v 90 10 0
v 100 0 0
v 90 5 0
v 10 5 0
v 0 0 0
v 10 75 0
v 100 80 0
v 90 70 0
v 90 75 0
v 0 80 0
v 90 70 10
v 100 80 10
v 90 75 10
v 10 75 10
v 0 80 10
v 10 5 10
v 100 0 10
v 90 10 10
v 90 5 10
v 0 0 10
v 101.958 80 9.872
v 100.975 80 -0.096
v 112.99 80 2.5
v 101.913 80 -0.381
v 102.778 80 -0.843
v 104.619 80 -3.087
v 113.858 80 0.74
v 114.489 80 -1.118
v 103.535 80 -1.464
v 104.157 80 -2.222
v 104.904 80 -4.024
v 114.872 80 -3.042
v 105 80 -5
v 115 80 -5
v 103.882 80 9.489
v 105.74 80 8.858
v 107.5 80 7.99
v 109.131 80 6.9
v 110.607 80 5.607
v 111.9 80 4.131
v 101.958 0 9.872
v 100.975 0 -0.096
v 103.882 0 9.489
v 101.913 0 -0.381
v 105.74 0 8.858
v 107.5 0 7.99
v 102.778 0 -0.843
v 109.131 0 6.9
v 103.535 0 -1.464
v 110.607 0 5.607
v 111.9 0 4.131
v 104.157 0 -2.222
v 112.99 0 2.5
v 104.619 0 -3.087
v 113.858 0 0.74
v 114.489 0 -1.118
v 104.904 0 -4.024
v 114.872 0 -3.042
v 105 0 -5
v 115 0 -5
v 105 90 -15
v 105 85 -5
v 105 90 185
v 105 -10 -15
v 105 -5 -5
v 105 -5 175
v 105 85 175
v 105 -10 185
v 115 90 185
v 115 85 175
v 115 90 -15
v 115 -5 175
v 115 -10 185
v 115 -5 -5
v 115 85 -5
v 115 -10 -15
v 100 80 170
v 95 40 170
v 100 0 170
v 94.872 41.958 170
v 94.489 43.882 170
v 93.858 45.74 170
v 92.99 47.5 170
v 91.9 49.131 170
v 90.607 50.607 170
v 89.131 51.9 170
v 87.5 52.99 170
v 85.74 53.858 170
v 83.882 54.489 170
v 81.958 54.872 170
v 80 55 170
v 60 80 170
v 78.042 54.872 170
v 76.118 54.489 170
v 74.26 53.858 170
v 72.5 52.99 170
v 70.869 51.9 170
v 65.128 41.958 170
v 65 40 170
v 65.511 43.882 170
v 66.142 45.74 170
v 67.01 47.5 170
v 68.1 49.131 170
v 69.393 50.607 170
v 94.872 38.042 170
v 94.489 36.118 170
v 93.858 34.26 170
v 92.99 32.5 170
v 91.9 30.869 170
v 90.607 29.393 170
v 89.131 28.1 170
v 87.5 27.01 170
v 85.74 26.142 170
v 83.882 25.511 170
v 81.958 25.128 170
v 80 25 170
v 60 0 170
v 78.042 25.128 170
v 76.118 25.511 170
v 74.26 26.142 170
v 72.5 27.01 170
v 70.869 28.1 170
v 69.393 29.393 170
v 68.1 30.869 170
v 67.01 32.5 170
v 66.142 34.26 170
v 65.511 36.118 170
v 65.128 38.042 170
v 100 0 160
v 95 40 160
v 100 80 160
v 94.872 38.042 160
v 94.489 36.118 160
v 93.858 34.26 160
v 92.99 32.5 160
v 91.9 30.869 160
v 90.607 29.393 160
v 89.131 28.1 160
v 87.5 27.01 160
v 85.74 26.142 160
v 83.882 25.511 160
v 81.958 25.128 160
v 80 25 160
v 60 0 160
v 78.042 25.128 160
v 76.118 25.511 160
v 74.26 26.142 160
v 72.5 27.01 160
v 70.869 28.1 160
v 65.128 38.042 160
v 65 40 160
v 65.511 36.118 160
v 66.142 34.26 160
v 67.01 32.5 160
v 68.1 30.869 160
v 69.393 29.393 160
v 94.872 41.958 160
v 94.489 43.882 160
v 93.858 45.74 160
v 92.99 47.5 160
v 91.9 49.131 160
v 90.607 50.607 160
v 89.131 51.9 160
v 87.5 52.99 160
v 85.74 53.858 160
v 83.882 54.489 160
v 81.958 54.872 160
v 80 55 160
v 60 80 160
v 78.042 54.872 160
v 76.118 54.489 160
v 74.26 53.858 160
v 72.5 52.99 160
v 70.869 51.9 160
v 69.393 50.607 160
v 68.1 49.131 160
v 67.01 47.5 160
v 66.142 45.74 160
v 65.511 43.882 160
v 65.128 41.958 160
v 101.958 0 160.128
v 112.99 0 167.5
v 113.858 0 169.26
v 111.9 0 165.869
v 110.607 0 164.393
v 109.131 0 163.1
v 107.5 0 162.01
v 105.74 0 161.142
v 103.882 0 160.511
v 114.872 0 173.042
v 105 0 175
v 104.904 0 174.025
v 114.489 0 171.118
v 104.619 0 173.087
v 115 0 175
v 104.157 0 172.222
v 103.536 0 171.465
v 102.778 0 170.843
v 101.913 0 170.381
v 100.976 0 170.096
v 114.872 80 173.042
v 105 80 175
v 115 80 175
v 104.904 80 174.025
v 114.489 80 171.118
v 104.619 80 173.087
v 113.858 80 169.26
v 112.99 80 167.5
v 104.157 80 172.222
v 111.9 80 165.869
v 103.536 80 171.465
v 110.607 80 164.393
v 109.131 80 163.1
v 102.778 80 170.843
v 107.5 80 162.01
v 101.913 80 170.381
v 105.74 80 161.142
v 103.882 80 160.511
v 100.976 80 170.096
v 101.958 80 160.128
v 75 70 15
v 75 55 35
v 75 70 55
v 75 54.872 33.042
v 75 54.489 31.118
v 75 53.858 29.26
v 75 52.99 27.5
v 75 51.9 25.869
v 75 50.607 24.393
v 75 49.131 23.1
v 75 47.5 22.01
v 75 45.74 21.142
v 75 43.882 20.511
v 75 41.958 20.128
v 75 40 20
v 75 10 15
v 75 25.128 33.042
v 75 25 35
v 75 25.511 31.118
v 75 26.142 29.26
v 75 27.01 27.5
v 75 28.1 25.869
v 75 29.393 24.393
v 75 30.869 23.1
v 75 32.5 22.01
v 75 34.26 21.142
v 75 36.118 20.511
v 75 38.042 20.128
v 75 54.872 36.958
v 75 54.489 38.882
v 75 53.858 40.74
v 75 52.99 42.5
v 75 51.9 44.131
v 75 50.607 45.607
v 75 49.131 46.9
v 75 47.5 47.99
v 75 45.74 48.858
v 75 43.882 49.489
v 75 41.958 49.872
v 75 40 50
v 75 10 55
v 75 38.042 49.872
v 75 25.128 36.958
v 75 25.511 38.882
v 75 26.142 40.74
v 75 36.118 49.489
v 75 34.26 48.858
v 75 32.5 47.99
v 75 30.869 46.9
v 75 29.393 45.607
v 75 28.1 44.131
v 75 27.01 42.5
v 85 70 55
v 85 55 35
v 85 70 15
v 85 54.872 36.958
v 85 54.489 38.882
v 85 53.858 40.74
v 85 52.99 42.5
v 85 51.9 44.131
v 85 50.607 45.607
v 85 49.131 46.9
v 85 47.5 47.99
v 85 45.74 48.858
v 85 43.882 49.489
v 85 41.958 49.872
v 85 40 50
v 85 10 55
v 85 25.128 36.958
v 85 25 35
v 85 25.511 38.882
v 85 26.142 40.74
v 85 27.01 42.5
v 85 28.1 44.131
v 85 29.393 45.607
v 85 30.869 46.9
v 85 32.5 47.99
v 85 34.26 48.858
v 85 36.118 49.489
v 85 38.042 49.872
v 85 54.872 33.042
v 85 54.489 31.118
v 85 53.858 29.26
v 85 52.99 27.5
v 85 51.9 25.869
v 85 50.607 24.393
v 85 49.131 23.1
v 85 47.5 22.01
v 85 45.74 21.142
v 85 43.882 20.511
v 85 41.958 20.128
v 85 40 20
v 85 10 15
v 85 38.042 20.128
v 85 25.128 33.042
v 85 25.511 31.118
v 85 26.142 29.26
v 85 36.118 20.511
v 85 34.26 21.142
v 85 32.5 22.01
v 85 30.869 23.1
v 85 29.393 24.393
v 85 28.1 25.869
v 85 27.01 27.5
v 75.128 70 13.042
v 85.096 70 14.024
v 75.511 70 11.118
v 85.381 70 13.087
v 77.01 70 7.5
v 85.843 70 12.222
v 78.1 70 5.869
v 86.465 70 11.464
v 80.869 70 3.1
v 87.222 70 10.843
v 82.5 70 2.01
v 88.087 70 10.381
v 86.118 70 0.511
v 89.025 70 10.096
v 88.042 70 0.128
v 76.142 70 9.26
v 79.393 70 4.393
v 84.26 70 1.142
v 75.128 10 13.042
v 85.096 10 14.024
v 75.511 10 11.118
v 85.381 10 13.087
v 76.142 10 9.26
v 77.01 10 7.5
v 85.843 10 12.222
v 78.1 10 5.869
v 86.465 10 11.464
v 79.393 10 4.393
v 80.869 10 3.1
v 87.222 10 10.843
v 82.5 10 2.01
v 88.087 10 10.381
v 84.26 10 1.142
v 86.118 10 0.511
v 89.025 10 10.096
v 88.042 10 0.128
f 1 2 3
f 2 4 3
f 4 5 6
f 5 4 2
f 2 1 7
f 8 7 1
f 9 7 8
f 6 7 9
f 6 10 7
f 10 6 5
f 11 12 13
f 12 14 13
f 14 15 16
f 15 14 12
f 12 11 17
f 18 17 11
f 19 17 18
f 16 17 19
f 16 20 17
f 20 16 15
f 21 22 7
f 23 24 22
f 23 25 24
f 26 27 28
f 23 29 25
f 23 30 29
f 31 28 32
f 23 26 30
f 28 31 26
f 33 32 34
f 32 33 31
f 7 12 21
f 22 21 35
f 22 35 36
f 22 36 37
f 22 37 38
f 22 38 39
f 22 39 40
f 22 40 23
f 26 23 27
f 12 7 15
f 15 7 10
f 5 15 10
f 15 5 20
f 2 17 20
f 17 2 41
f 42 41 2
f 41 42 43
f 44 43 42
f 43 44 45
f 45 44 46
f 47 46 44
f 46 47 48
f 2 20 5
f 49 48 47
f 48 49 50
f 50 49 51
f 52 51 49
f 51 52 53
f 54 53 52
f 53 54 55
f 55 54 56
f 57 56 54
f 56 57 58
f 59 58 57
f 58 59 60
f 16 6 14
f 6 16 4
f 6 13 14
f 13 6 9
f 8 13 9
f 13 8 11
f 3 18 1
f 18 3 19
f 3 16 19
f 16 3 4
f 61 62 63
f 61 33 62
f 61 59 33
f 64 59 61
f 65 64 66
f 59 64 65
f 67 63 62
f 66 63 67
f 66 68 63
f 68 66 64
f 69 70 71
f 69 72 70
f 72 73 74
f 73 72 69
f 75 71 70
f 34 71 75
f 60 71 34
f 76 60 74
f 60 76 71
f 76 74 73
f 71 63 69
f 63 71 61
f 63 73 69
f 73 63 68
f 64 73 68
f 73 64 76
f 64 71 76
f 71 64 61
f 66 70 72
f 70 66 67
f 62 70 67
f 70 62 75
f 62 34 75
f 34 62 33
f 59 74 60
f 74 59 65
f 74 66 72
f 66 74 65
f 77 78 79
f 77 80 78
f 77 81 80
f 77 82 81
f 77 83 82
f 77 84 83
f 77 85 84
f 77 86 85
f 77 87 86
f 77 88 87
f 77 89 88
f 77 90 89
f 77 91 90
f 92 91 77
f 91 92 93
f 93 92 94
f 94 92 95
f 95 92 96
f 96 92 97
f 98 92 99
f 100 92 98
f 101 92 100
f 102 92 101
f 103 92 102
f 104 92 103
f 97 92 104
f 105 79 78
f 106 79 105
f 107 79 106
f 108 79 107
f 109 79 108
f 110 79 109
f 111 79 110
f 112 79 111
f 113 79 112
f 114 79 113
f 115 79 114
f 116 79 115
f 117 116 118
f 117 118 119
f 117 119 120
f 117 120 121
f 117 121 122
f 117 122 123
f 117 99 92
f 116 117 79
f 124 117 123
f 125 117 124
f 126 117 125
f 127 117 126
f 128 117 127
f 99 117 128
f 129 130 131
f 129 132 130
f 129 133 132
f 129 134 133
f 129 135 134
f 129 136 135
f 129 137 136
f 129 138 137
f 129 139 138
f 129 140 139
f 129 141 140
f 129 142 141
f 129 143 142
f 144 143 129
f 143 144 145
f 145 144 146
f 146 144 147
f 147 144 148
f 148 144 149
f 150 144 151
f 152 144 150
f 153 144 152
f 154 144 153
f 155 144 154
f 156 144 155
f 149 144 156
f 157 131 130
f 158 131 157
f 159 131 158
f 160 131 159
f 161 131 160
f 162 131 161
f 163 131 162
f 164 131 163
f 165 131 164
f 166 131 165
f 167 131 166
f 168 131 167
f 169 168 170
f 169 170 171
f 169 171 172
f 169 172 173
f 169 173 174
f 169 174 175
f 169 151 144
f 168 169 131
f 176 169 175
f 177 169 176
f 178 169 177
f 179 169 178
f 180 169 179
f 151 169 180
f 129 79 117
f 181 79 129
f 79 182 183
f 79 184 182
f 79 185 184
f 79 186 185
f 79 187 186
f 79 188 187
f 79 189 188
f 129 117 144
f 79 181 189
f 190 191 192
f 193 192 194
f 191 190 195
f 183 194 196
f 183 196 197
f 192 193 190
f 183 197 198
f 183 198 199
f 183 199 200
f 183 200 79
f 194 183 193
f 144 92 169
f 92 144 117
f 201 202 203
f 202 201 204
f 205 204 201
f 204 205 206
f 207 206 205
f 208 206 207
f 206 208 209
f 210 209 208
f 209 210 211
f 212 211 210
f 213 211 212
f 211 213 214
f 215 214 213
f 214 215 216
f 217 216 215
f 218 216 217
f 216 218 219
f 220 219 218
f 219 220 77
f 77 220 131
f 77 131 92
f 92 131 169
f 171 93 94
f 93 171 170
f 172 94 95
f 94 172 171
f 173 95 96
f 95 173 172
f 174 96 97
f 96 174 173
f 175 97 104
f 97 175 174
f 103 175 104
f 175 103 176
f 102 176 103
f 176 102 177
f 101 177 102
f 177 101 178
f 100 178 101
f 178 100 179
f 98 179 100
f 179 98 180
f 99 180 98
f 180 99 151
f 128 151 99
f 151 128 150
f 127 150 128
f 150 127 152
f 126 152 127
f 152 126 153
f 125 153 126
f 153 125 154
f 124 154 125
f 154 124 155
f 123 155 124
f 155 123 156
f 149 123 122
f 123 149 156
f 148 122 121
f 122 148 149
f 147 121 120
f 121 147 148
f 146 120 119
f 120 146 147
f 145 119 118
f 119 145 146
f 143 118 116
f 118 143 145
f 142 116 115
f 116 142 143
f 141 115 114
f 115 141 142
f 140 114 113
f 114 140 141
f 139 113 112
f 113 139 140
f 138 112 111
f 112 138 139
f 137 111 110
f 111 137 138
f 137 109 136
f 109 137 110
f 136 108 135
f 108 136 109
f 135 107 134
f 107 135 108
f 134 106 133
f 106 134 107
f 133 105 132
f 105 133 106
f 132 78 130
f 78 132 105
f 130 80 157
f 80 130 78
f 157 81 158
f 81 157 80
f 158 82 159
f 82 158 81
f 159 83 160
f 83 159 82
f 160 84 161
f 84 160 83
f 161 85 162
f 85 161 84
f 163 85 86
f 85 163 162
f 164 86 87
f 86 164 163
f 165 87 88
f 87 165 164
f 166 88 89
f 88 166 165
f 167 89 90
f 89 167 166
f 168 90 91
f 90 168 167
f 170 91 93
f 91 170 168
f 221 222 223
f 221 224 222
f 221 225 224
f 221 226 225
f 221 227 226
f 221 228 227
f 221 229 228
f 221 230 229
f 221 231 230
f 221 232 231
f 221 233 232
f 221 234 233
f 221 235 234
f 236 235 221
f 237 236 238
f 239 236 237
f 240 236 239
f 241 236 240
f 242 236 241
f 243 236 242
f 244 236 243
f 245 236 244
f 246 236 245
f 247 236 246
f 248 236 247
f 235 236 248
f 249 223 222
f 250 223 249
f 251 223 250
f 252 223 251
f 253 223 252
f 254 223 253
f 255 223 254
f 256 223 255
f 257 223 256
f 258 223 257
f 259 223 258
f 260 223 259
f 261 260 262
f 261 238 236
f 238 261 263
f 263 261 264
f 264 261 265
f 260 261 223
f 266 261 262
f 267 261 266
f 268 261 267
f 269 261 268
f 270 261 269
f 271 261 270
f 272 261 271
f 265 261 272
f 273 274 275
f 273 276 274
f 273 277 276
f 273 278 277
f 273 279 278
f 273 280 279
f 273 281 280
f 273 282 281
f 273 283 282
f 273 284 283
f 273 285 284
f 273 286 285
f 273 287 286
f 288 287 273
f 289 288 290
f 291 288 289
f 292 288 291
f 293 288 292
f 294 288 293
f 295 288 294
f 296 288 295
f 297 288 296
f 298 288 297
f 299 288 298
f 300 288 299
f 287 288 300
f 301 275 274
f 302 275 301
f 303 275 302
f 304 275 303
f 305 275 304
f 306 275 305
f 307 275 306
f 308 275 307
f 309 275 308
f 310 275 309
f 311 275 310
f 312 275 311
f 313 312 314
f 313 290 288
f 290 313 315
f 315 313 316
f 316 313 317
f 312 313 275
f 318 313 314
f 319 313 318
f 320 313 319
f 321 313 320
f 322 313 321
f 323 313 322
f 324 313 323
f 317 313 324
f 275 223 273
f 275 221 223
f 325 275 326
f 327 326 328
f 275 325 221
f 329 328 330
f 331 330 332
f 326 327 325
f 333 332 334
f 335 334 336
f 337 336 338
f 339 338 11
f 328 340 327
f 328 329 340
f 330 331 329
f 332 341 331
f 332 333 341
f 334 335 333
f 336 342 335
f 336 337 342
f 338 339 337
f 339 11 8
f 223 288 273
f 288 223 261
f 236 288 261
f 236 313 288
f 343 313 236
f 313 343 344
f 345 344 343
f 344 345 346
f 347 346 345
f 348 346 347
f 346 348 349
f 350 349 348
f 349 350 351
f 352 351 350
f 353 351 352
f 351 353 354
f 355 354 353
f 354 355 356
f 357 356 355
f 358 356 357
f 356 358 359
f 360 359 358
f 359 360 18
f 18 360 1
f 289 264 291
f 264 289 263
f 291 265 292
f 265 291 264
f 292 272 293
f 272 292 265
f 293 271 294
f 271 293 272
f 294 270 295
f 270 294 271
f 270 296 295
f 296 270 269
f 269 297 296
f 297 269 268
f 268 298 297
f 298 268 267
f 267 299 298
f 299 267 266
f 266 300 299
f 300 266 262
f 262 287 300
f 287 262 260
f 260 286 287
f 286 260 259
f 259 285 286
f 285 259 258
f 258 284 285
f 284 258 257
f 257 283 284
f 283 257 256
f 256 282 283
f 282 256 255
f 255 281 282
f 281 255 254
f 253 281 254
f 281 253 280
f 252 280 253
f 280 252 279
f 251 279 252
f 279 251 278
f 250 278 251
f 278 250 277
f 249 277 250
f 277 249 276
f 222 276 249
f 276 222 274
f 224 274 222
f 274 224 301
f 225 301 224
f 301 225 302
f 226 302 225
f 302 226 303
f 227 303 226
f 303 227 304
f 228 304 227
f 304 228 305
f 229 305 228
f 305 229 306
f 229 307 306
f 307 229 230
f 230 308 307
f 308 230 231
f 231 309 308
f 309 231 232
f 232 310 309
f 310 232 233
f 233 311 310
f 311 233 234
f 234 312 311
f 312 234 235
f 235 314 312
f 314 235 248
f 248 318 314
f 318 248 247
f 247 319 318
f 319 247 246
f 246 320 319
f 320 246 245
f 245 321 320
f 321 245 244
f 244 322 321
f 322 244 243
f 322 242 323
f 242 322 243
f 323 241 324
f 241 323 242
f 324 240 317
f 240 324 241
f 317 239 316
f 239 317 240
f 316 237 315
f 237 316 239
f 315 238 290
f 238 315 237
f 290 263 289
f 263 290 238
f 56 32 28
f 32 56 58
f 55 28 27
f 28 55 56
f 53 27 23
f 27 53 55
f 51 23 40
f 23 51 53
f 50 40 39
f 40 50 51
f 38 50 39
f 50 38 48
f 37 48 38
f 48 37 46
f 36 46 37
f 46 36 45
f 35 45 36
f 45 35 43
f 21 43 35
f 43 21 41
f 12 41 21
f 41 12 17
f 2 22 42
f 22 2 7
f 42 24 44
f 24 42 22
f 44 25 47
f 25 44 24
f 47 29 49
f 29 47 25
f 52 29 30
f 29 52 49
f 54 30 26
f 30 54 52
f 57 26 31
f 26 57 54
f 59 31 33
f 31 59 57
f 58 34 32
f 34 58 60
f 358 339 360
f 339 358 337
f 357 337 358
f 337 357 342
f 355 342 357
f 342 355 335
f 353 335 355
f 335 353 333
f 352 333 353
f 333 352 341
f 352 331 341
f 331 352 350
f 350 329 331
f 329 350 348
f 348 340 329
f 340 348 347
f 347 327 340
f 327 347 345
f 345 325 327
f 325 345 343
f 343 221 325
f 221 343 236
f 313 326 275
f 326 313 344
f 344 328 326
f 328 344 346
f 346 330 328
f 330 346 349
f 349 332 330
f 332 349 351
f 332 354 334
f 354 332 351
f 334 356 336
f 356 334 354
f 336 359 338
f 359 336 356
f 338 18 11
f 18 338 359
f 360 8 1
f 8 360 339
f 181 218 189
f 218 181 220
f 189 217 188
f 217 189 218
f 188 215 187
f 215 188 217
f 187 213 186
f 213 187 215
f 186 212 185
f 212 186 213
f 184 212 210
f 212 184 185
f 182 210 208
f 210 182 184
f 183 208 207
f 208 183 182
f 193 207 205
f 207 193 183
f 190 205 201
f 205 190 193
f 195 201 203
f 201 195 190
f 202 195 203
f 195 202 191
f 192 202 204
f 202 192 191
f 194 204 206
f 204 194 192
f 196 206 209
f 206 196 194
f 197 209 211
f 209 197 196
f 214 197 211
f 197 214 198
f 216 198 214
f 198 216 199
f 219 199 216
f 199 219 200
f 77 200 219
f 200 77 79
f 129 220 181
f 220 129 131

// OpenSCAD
// Generated by Parametrix
ca_sfCheck_SFG_pattern_000 = [ [ -74.2920, -10.0000 ],[ 125.7080, -10.0000 ],[ 125.7080, 90.0000 ],[ -74.2920, 90.0000 ],[ -74.2920, -10.0000 ] ];
cb_sfCheck_SFG_pattern_000 = [  0, 1, 2, 3, 4 ];
ca_sfCheck_SFG_pattern_001 = [ [ 0.0000, 0.0000 ],[ 100.0000, 0.0000 ],[ 115.7080, -0.0000 ],[ 115.7080, -5.0000 ],[ -64.2920, -5.0000 ],[ -64.2920, -0.0000 ],[ -48.5841, 0.0000 ],[ -8.5841, 0.0000 ],[ -8.5841, 80.0000 ],[ -48.5841, 80.0000 ],[ -64.2920, 80.0000 ],[ -64.2920, 85.0000 ],[ 115.7080, 85.0000 ],[ 115.7080, 80.0000 ],[ 100.0000, 80.0000 ],[ 0.0000, 80.0000 ],[ 0.0000, 0.0000 ] ];
cb_sfCheck_SFG_pattern_001 = [  5, 6, 7, 8, 9, 10, 11, 12, 13, 14, 15, 16, 17, 18, 19, 20, 21 ];
ca_sfCheck_SFG_pattern_002 = [ [ 10.0000, 5.0000 ],[ 10.0000, 75.0000 ],[ 90.0000, 75.0000 ],[ 90.0000, 70.0000 ],[ 74.2920, 70.0000 ],[ 34.2920, 70.0000 ],[ 34.2920, 10.0000 ],[ 74.2920, 10.0000 ],[ 90.0000, 10.0000 ],[ 90.0000, 5.0000 ],[ 10.0000, 5.0000 ] ];
cb_sfCheck_SFG_pattern_002 = [  22, 23, 24, 25, 26, 27, 28, 29, 30, 31, 32 ];
ca_sfCheck_SFG_pattern_003 = [ [ 0.0000, 0.0000 ],[ 100.0000, 0.0000 ],[ 115.7080, -0.0000 ],[ 115.7080, -5.0000 ],[ -64.2920, -5.0000 ],[ -64.2920, -0.0000 ],[ -48.5841, 0.0000 ],[ -8.5841, 0.0000 ],[ -8.5841, 80.0000 ],[ -48.5841, 80.0000 ],[ -64.2920, 80.0000 ],[ -64.2920, 85.0000 ],[ 115.7080, 85.0000 ],[ 115.7080, 80.0000 ],[ 100.0000, 80.0000 ],[ 0.0000, 80.0000 ],[ 0.0000, 0.0000 ] ];
cb_sfCheck_SFG_pattern_003 = [  33, 34, 35, 36, 37, 38, 39, 40, 41, 42, 43, 44, 45, 46, 47, 48, 49 ];
ca_sfCheck_SFG_pattern_004 = [ [ -13.5841, 40.0000 ],[ -13.7124, 41.9579 ],[ -14.0952, 43.8823 ],[ -14.7259, 45.7403 ],[ -15.5937, 47.5000 ],[ -16.6838, 49.1314 ],[ -17.9775, 50.6066 ],[ -19.4527, 51.9003 ],[ -21.0841, 52.9904 ],[ -22.8438, 53.8582 ],[ -24.7018, 54.4889 ],[ -26.6262, 54.8717 ],[ -28.5841, 55.0000 ],[ -30.5420, 54.8717 ],[ -32.4664, 54.4889 ],[ -34.3243, 53.8582 ],[ -36.0841, 52.9904 ],[ -37.7155, 51.9003 ],[ -39.1907, 50.6066 ],[ -40.4844, 49.1314 ],[ -41.5745, 47.5000 ],[ -42.4423, 45.7403 ],[ -43.0730, 43.8823 ],[ -43.4557, 41.9579 ],[ -43.5841, 40.0000 ],[ -43.4557, 38.0421 ],[ -43.0730, 36.1177 ],[ -42.4423, 34.2597 ],[ -41.5745, 32.5000 ],[ -40.4844, 30.8686 ],[ -39.1907, 29.3934 ],[ -37.7155, 28.0997 ],[ -36.0841, 27.0096 ],[ -34.3243, 26.1418 ],[ -32.4664, 25.5111 ],[ -30.5420, 25.1283 ],[ -28.5841, 25.0000 ],[ -26.6262, 25.1283 ],[ -24.7018, 25.5111 ],[ -22.8438, 26.1418 ],[ -21.0841, 27.0096 ],[ -19.4527, 28.0997 ],[ -17.9775, 29.3934 ],[ -16.6838, 30.8686 ],[ -15.5937, 32.5000 ],[ -14.7259, 34.2597 ],[ -14.0952, 36.1177 ],[ -13.7124, 38.0421 ],[ -13.5841, 40.0000 ] ];
cb_sfCheck_SFG_pattern_004 = [  50, 51, 52, 53, 54, 55, 56, 57, 58, 59, 60, 61, 62, 63, 64, 65, 66, 67, 68, 69, 70, 71, 72, 73, 74, 75, 76, 77, 78, 79, 80, 81, 82, 83, 84, 85, 86, 87, 88, 89, 90, 91, 92, 93, 94, 95, 96, 97, 98 ];
ca_sfCheck_SFG_pattern_005 = [ [ 69.2920, 40.0000 ],[ 69.1637, 41.9579 ],[ 68.7809, 43.8823 ],[ 68.1502, 45.7403 ],[ 67.2824, 47.5000 ],[ 66.1923, 49.1314 ],[ 64.8986, 50.6066 ],[ 63.4235, 51.9003 ],[ 61.7920, 52.9904 ],[ 60.0323, 53.8582 ],[ 58.1743, 54.4889 ],[ 56.2499, 54.8717 ],[ 54.2920, 55.0000 ],[ 52.3341, 54.8717 ],[ 50.4098, 54.4889 ],[ 48.5518, 53.8582 ],[ 46.7920, 52.9904 ],[ 45.1606, 51.9003 ],[ 43.6854, 50.6066 ],[ 42.3917, 49.1314 ],[ 41.3017, 47.5000 ],[ 40.4338, 45.7403 ],[ 39.8031, 43.8823 ],[ 39.4204, 41.9579 ],[ 39.2920, 40.0000 ],[ 39.4204, 38.0421 ],[ 39.8031, 36.1177 ],[ 40.4338, 34.2597 ],[ 41.3017, 32.5000 ],[ 42.3917, 30.8686 ],[ 43.6854, 29.3934 ],[ 45.1606, 28.0997 ],[ 46.7920, 27.0096 ],[ 48.5518, 26.1418 ],[ 50.4098, 25.5111 ],[ 52.3341, 25.1283 ],[ 54.2920, 25.0000 ],[ 56.2499, 25.1283 ],[ 58.1743, 25.5111 ],[ 60.0323, 26.1418 ],[ 61.7920, 27.0096 ],[ 63.4235, 28.0997 ],[ 64.8986, 29.3934 ],[ 66.1923, 30.8686 ],[ 67.2824, 32.5000 ],[ 68.1502, 34.2597 ],[ 68.7809, 36.1177 ],[ 69.1637, 38.0421 ],[ 69.2920, 40.0000 ] ];
cb_sfCheck_SFG_pattern_005 = [  99, 100, 101, 102, 103, 104, 105, 106, 107, 108, 109, 110, 111, 112, 113, 114, 115, 116, 117, 118, 119, 120, 121, 122, 123, 124, 125, 126, 127, 128, 129, 130, 131, 132, 133, 134, 135, 136, 137, 138, 139, 140, 141, 142, 143, 144, 145, 146, 147 ];
ca_sfCheck_SFG_pattern_006 = [ [ 114.7080, 39.0000 ],[ 114.9031, 39.0192 ],[ 115.0906, 39.0761 ],[ 115.2635, 39.1685 ],[ 115.4151, 39.2929 ],[ 115.5394, 39.4444 ],[ 115.6318, 39.6173 ],[ 115.6887, 39.8049 ],[ 115.7080, 40.0000 ],[ 115.6887, 40.1951 ],[ 115.6318, 40.3827 ],[ 115.5394, 40.5556 ],[ 115.4151, 40.7071 ],[ 115.2635, 40.8315 ],[ 115.0906, 40.9239 ],[ 114.9031, 40.9808 ],[ 114.7080, 41.0000 ],[ 101.0000, 41.0000 ],[ 100.8049, 40.9808 ],[ 100.6173, 40.9239 ],[ 100.4444, 40.8315 ],[ 100.2929, 40.7071 ],[ 100.1685, 40.5556 ],[ 100.0761, 40.3827 ],[ 100.0192, 40.1951 ],[ 100.0000, 40.0000 ],[ 100.0192, 39.8049 ],[ 100.0761, 39.6173 ],[ 100.1685, 39.4444 ],[ 100.2929, 39.2929 ],[ 100.4444, 39.1685 ],[ 100.6173, 39.0761 ],[ 100.8049, 39.0192 ],[ 101.0000, 39.0000 ],[ 114.7080, 39.0000 ] ];
cb_sfCheck_SFG_pattern_006 = [  148, 149, 150, 151, 152, 153, 154, 155, 156, 157, 158, 159, 160, 161, 162, 163, 164, 165, 166, 167, 168, 169, 170, 171, 172, 173, 174, 175, 176, 177, 178, 179, 180, 181, 182 ];
ca_sfCheck_SFG_pattern_007 = [ [ 89.0000, 39.0000 ],[ 89.1951, 39.0192 ],[ 89.3827, 39.0761 ],[ 89.5556, 39.1685 ],[ 89.7071, 39.2929 ],[ 89.8315, 39.4444 ],[ 89.9239, 39.6173 ],[ 89.9808, 39.8049 ],[ 90.0000, 40.0000 ],[ 89.9808, 40.1951 ],[ 89.9239, 40.3827 ],[ 89.8315, 40.5556 ],[ 89.7071, 40.7071 ],[ 89.5556, 40.8315 ],[ 89.3827, 40.9239 ],[ 89.1951, 40.9808 ],[ 89.0000, 41.0000 ],[ 75.2920, 41.0000 ],[ 75.0969, 40.9808 ],[ 74.9094, 40.9239 ],[ 74.7365, 40.8315 ],[ 74.5849, 40.7071 ],[ 74.4606, 40.5556 ],[ 74.3682, 40.3827 ],[ 74.3113, 40.1951 ],[ 74.2920, 40.0000 ],[ 74.3113, 39.8049 ],[ 74.3682, 39.6173 ],[ 74.4606, 39.4444 ],[ 74.5849, 39.2929 ],[ 74.7365, 39.1685 ],[ 74.9094, 39.0761 ],[ 75.0969, 39.0192 ],[ 75.2920, 39.0000 ],[ 89.0000, 39.0000 ] ];
cb_sfCheck_SFG_pattern_007 = [  183, 184, 185, 186, 187, 188, 189, 190, 191, 192, 193, 194, 195, 196, 197, 198, 199, 200, 201, 202, 203, 204, 205, 206, 207, 208, 209, 210, 211, 212, 213, 214, 215, 216, 217 ];
ca_sfCheck_SFG_pattern_008 = [ [ -63.2920, 41.0000 ],[ -63.4871, 40.9808 ],[ -63.6747, 40.9239 ],[ -63.8476, 40.8315 ],[ -63.9991, 40.7071 ],[ -64.1235, 40.5556 ],[ -64.2159, 40.3827 ],[ -64.2728, 40.1951 ],[ -64.2920, 40.0000 ],[ -64.2728, 39.8049 ],[ -64.2159, 39.6173 ],[ -64.1235, 39.4444 ],[ -63.9991, 39.2929 ],[ -63.8476, 39.1685 ],[ -63.6747, 39.0761 ],[ -63.4871, 39.0192 ],[ -63.2920, 39.0000 ],[ -49.5841, 39.0000 ],[ -49.3890, 39.0192 ],[ -49.2014, 39.0761 ],[ -49.0285, 39.1685 ],[ -48.8770, 39.2929 ],[ -48.7526, 39.4444 ],[ -48.6602, 39.6173 ],[ -48.6033, 39.8049 ],[ -48.5841, 40.0000 ],[ -48.6033, 40.1951 ],[ -48.6602, 40.3827 ],[ -48.7526, 40.5556 ],[ -48.8770, 40.7071 ],[ -49.0285, 40.8315 ],[ -49.2014, 40.9239 ],[ -49.3890, 40.9808 ],[ -49.5841, 41.0000 ],[ -63.2920, 41.0000 ] ];
cb_sfCheck_SFG_pattern_008 = [  218, 219, 220, 221, 222, 223, 224, 225, 226, 227, 228, 229, 230, 231, 232, 233, 234, 235, 236, 237, 238, 239, 240, 241, 242, 243, 244, 245, 246, 247, 248, 249, 250, 251, 252 ];
a_sfCheck_SFG_pattern = concat(ca_sfCheck_SFG_pattern_000, ca_sfCheck_SFG_pattern_001, ca_sfCheck_SFG_pattern_002, ca_sfCheck_SFG_pattern_003, ca_sfCheck_SFG_pattern_004, ca_sfCheck_SFG_pattern_005, ca_sfCheck_SFG_pattern_006, ca_sfCheck_SFG_pattern_007, ca_sfCheck_SFG_pattern_008);
b_sfCheck_SFG_pattern = [cb_sfCheck_SFG_pattern_000, cb_sfCheck_SFG_pattern_001, cb_sfCheck_SFG_pattern_002, cb_sfCheck_SFG_pattern_003, cb_sfCheck_SFG_pattern_004, cb_sfCheck_SFG_pattern_005, cb_sfCheck_SFG_pattern_006, cb_sfCheck_SFG_pattern_007, cb_sfCheck_SFG_pattern_008];
ca_sfCheck_SFG_profiles_000 = [ [ 0.0000, 0.0000 ],[ 10.0000, 0.0000 ],[ 10.0000, 10.0000 ],[ 0.0000, 10.0000 ],[ 0.0000, 0.0000 ] ];
cb_sfCheck_SFG_profiles_000 = [  0, 1, 2, 3, 4 ];
ca_sfCheck_SFG_profiles_001 = [ [ 10.0000, 0.0000 ],[ 10.9755, -0.0961 ],[ 11.9134, -0.3806 ],[ 12.7779, -0.8427 ],[ 13.5355, -1.4645 ],[ 14.1573, -2.2221 ],[ 14.6194, -3.0866 ],[ 14.9039, -4.0245 ],[ 15.0000, -5.0000 ],[ 25.0000, -5.0000 ],[ 24.8717, -3.0421 ],[ 24.4889, -1.1177 ],[ 23.8582, 0.7403 ],[ 22.9904, 2.5000 ],[ 21.9003, 4.1314 ],[ 20.6066, 5.6066 ],[ 19.1314, 6.9003 ],[ 17.5000, 7.9904 ],[ 15.7403, 8.8582 ],[ 13.8823, 9.4889 ],[ 11.9579, 9.8717 ],[ 10.0000, 10.0000 ],[ 10.0000, 0.0000 ] ];
cb_sfCheck_SFG_profiles_001 = [  5, 6, 7, 8, 9, 10, 11, 12, 13, 14, 15, 16, 17, 18, 19, 20, 21, 22, 23, 24, 25, 26, 27 ];
ca_sfCheck_SFG_profiles_002 = [ [ 15.0000, -5.0000 ],[ 15.0000, -15.0000 ],[ 25.0000, -15.0000 ],[ 25.0000, -5.0000 ],[ 15.0000, -5.0000 ] ];
cb_sfCheck_SFG_profiles_002 = [  28, 29, 30, 31, 32 ];
ca_sfCheck_SFG_profiles_003 = [ [ 0.0000, 10.0000 ],[ -0.9755, 10.0961 ],[ -1.9134, 10.3806 ],[ -2.7779, 10.8427 ],[ -3.5355, 11.4645 ],[ -4.1573, 12.2221 ],[ -4.6194, 13.0866 ],[ -4.9039, 14.0245 ],[ -5.0000, 15.0000 ],[ -15.0000, 15.0000 ],[ -14.8717, 13.0421 ],[ -14.4889, 11.1177 ],[ -13.8582, 9.2597 ],[ -12.9904, 7.5000 ],[ -11.9003, 5.8686 ],[ -10.6066, 4.3934 ],[ -9.1314, 3.0997 ],[ -7.5000, 2.0096 ],[ -5.7403, 1.1418 ],[ -3.8823, 0.5111 ],[ -1.9579, 0.1283 ],[ 0.0000, 0.0000 ],[ 0.0000, 10.0000 ] ];
cb_sfCheck_SFG_profiles_003 = [  33, 34, 35, 36, 37, 38, 39, 40, 41, 42, 43, 44, 45, 46, 47, 48, 49, 50, 51, 52, 53, 54, 55 ];
ca_sfCheck_SFG_profiles_004 = [ [ -5.0000, 15.0000 ],[ -5.0000, 55.0000 ],[ -15.0000, 55.0000 ],[ -15.0000, 15.0000 ],[ -5.0000, 15.0000 ] ];
cb_sfCheck_SFG_profiles_004 = [  56, 57, 58, 59, 60 ];
ca_sfCheck_SFG_profiles_005 = [ [ 0.0000, 400.0000 ],[ 10.0000, 400.0000 ],[ 10.0000, 410.0000 ],[ 0.0000, 410.0000 ],[ 0.0000, 400.0000 ] ];
cb_sfCheck_SFG_profiles_005 = [  61, 62, 63, 64, 65 ];
ca_sfCheck_SFG_profiles_006 = [ [ 10.0000, 400.0000 ],[ 10.9755, 399.9039 ],[ 11.9134, 399.6194 ],[ 12.7779, 399.1573 ],[ 13.5355, 398.5355 ],[ 14.1573, 397.7779 ],[ 14.6194, 396.9134 ],[ 14.9039, 395.9755 ],[ 15.0000, 395.0000 ],[ 25.0000, 395.0000 ],[ 24.8717, 396.9579 ],[ 24.4889, 398.8823 ],[ 23.8582, 400.7403 ],[ 22.9904, 402.5000 ],[ 21.9003, 404.1314 ],[ 20.6066, 405.6066 ],[ 19.1314, 406.9003 ],[ 17.5000, 407.9904 ],[ 15.7403, 408.8582 ],[ 13.8823, 409.4889 ],[ 11.9579, 409.8717 ],[ 10.0000, 410.0000 ],[ 10.0000, 400.0000 ] ];
cb_sfCheck_SFG_profiles_006 = [  66, 67, 68, 69, 70, 71, 72, 73, 74, 75, 76, 77, 78, 79, 80, 81, 82, 83, 84, 85, 86, 87, 88 ];
ca_sfCheck_SFG_profiles_007 = [ [ 15.0000, 395.0000 ],[ 15.0000, 355.0000 ],[ 25.0000, 355.0000 ],[ 25.0000, 395.0000 ],[ 15.0000, 395.0000 ] ];
cb_sfCheck_SFG_profiles_007 = [  89, 90, 91, 92, 93 ];
a_sfCheck_SFG_profiles = concat(ca_sfCheck_SFG_profiles_000, ca_sfCheck_SFG_profiles_001, ca_sfCheck_SFG_profiles_002, ca_sfCheck_SFG_profiles_003, ca_sfCheck_SFG_profiles_004, ca_sfCheck_SFG_profiles_005, ca_sfCheck_SFG_profiles_006, ca_sfCheck_SFG_profiles_007);
b_sfCheck_SFG_profiles = [cb_sfCheck_SFG_profiles_000, cb_sfCheck_SFG_profiles_001, cb_sfCheck_SFG_profiles_002, cb_sfCheck_SFG_profiles_003, cb_sfCheck_SFG_profiles_004, cb_sfCheck_SFG_profiles_005, cb_sfCheck_SFG_profiles_006, cb_sfCheck_SFG_profiles_007];
ca_sfCheck_SFG_f00_000 = [ [ 0.0000, 0.0000 ],[ 100.0000, 0.0000 ],[ 100.0000, 80.0000 ],[ 0.0000, 80.0000 ],[ 0.0000, 0.0000 ] ];
cb_sfCheck_SFG_f00_000 = [  0, 1, 2, 3, 4 ];
ca_sfCheck_SFG_f00_001 = [ [ 10.0000, 5.0000 ],[ 90.0000, 5.0000 ],[ 90.0000, 10.0000 ],[ 90.0000, 70.0000 ],[ 90.0000, 75.0000 ],[ 10.0000, 75.0000 ],[ 10.0000, 5.0000 ] ];
cb_sfCheck_SFG_f00_001 = [  5, 6, 7, 8, 9, 10, 11 ];
a_sfCheck_SFG_f00 = concat(ca_sfCheck_SFG_f00_000, ca_sfCheck_SFG_f00_001);
b_sfCheck_SFG_f00 = [cb_sfCheck_SFG_f00_000, cb_sfCheck_SFG_f00_001];
ca_sfCheck_SFG_f01_000 = [ [ -190.0000, -10.0000 ],[ 10.0000, -10.0000 ],[ 10.0000, 90.0000 ],[ -190.0000, 90.0000 ],[ -190.0000, -10.0000 ] ];
cb_sfCheck_SFG_f01_000 = [  0, 1, 2, 3, 4 ];
ca_sfCheck_SFG_f01_001 = [ [ -180.0000, -5.0000 ],[ 0.0000, -5.0000 ],[ 0.0000, 0.0000 ],[ 0.0000, 80.0000 ],[ 0.0000, 85.0000 ],[ -180.0000, 85.0000 ],[ -180.0000, 80.0000 ],[ -180.0000, 0.0000 ],[ -180.0000, -5.0000 ] ];
cb_sfCheck_SFG_f01_001 = [  5, 6, 7, 8, 9, 10, 11, 12, 13 ];
a_sfCheck_SFG_f01 = concat(ca_sfCheck_SFG_f01_000, ca_sfCheck_SFG_f01_001);
b_sfCheck_SFG_f01 = [cb_sfCheck_SFG_f01_000, cb_sfCheck_SFG_f01_001];
ca_sfCheck_SFG_f02_000 = [ [ 0.0000, 80.0000 ],[ -40.0000, 80.0000 ],[ -40.0000, 0.0000 ],[ 0.0000, 0.0000 ],[ 0.0000, 80.0000 ] ];
cb_sfCheck_SFG_f02_000 = [  0, 1, 2, 3, 4 ];
ca_sfCheck_SFG_f02_001 = [ [ -5.0000, 40.0000 ],[ -5.1283, 41.9579 ],[ -5.5111, 43.8823 ],[ -6.1418, 45.7403 ],[ -7.0096, 47.5000 ],[ -8.0997, 49.1314 ],[ -9.3934, 50.6066 ],[ -10.8686, 51.9003 ],[ -12.5000, 52.9904 ],[ -14.2597, 53.8582 ],[ -16.1177, 54.4889 ],[ -18.0421, 54.8717 ],[ -20.0000, 55.0000 ],[ -21.9579, 54.8717 ],[ -23.8823, 54.4889 ],[ -25.7403, 53.8582 ],[ -27.5000, 52.9904 ],[ -29.1314, 51.9003 ],[ -30.6066, 50.6066 ],[ -31.9003, 49.1314 ],[ -32.9904, 47.5000 ],[ -33.8582, 45.7403 ],[ -34.4889, 43.8823 ],[ -34.8717, 41.9579 ],[ -35.0000, 40.0000 ],[ -34.8717, 38.0421 ],[ -34.4889, 36.1177 ],[ -33.8582, 34.2597 ],[ -32.9904, 32.5000 ],[ -31.9003, 30.8686 ],[ -30.6066, 29.3934 ],[ -29.1314, 28.0997 ],[ -27.5000, 27.0096 ],[ -25.7403, 26.1418 ],[ -23.8823, 25.5111 ],[ -21.9579, 25.1283 ],[ -20.0000, 25.0000 ],[ -18.0421, 25.1283 ],[ -16.1177, 25.5111 ],[ -14.2597, 26.1418 ],[ -12.5000, 27.0096 ],[ -10.8686, 28.0997 ],[ -9.3934, 29.3934 ],[ -8.0997, 30.8686 ],[ -7.0096, 32.5000 ],[ -6.1418, 34.2597 ],[ -5.5111, 36.1177 ],[ -5.1283, 38.0421 ],[ -5.0000, 40.0000 ] ];
cb_sfCheck_SFG_f02_001 = [  5, 6, 7, 8, 9, 10, 11, 12, 13, 14, 15, 16, 17, 18, 19, 20, 21, 22, 23, 24, 25, 26, 27, 28, 29, 30, 31, 32, 33, 34, 35, 36, 37, 38, 39, 40, 41, 42, 43, 44, 45, 46, 47, 48, 49, 50, 51, 52, 53 ];
a_sfCheck_SFG_f02 = concat(ca_sfCheck_SFG_f02_000, ca_sfCheck_SFG_f02_001);
b_sfCheck_SFG_f02 = [cb_sfCheck_SFG_f02_000, cb_sfCheck_SFG_f02_001];
ca_sfCheck_SFG_f03_000 = [ [ -40.0000, 0.0000 ],[ 0.0000, 0.0000 ],[ 0.0000, 60.0000 ],[ -40.0000, 60.0000 ],[ -40.0000, 0.0000 ] ];
cb_sfCheck_SFG_f03_000 = [  0, 1, 2, 3, 4 ];
ca_sfCheck_SFG_f03_001 = [ [ -5.0000, 30.0000 ],[ -5.1283, 31.9579 ],[ -5.5111, 33.8823 ],[ -6.1418, 35.7403 ],[ -7.0096, 37.5000 ],[ -8.0997, 39.1314 ],[ -9.3934, 40.6066 ],[ -10.8686, 41.9003 ],[ -12.5000, 42.9904 ],[ -14.2597, 43.8582 ],[ -16.1177, 44.4889 ],[ -18.0421, 44.8717 ],[ -20.0000, 45.0000 ],[ -21.9579, 44.8717 ],[ -23.8823, 44.4889 ],[ -25.7403, 43.8582 ],[ -27.5000, 42.9904 ],[ -29.1314, 41.9003 ],[ -30.6066, 40.6066 ],[ -31.9003, 39.1314 ],[ -32.9904, 37.5000 ],[ -33.8582, 35.7403 ],[ -34.4889, 33.8823 ],[ -34.8717, 31.9579 ],[ -35.0000, 30.0000 ],[ -34.8717, 28.0421 ],[ -34.4889, 26.1177 ],[ -33.8582, 24.2597 ],[ -32.9904, 22.5000 ],[ -31.9003, 20.8686 ],[ -30.6066, 19.3934 ],[ -29.1314, 18.0997 ],[ -27.5000, 17.0096 ],[ -25.7403, 16.1418 ],[ -23.8823, 15.5111 ],[ -21.9579, 15.1283 ],[ -20.0000, 15.0000 ],[ -18.0421, 15.1283 ],[ -16.1177, 15.5111 ],[ -14.2597, 16.1418 ],[ -12.5000, 17.0096 ],[ -10.8686, 18.0997 ],[ -9.3934, 19.3934 ],[ -8.0997, 20.8686 ],[ -7.0096, 22.5000 ],[ -6.1418, 24.2597 ],[ -5.5111, 26.1177 ],[ -5.1283, 28.0421 ],[ -5.0000, 30.0000 ] ];
cb_sfCheck_SFG_f03_001 = [  5, 6, 7, 8, 9, 10, 11, 12, 13, 14, 15, 16, 17, 18, 19, 20, 21, 22, 23, 24, 25, 26, 27, 28, 29, 30, 31, 32, 33, 34, 35, 36, 37, 38, 39, 40, 41, 42, 43, 44, 45, 46, 47, 48, 49, 50, 51, 52, 53 ];
a_sfCheck_SFG_f03 = concat(ca_sfCheck_SFG_f03_000, ca_sfCheck_SFG_f03_001);
b_sfCheck_SFG_f03 = [cb_sfCheck_SFG_f03_000, cb_sfCheck_SFG_f03_001];
ca_sfCheck_SFG_fj00_000 = [ [ 0.0000, 0.0000 ],[ 0.9755, -0.0961 ],[ 1.9134, -0.3806 ],[ 2.7779, -0.8427 ],[ 3.5355, -1.4645 ],[ 4.1573, -2.2221 ],[ 4.6194, -3.0866 ],[ 4.9039, -4.0245 ],[ 5.0000, -5.0000 ],[ 15.0000, -5.0000 ],[ 14.8717, -3.0421 ],[ 14.4889, -1.1177 ],[ 13.8582, 0.7403 ],[ 12.9904, 2.5000 ],[ 11.9003, 4.1314 ],[ 10.6066, 5.6066 ],[ 9.1314, 6.9003 ],[ 7.5000, 7.9904 ],[ 5.7403, 8.8582 ],[ 3.8823, 9.4889 ],[ 1.9579, 9.8717 ],[ -0.0000, 10.0000 ],[ 0.0000, 0.0000 ] ];
cb_sfCheck_SFG_fj00_000 = [  0, 1, 2, 3, 4, 5, 6, 7, 8, 9, 10, 11, 12, 13, 14, 15, 16, 17, 18, 19, 20, 21, 22 ];
a_sfCheck_SFG_fj00 = concat(ca_sfCheck_SFG_fj00_000);
b_sfCheck_SFG_fj00 = [cb_sfCheck_SFG_fj00_000];
ca_sfCheck_SFG_fj01_000 = [ [ 0.0000, 0.0000 ],[ 1.9579, 0.1283 ],[ 3.8823, 0.5111 ],[ 5.7403, 1.1418 ],[ 7.5000, 2.0096 ],[ 9.1314, 3.0997 ],[ 10.6066, 4.3934 ],[ 11.9003, 5.8686 ],[ 12.9904, 7.5000 ],[ 13.8582, 9.2597 ],[ 14.4889, 11.1177 ],[ 14.8717, 13.0421 ],[ 15.0000, 15.0000 ],[ 5.0000, 15.0000 ],[ 4.9039, 14.0245 ],[ 4.6194, 13.0866 ],[ 4.1573, 12.2221 ],[ 3.5355, 11.4645 ],[ 2.7779, 10.8427 ],[ 1.9134, 10.3806 ],[ 0.9755, 10.0961 ],[ -0.0000, 10.0000 ],[ 0.0000, 0.0000 ] ];
cb_sfCheck_SFG_fj01_000 = [  0, 1, 2, 3, 4, 5, 6, 7, 8, 9, 10, 11, 12, 13, 14, 15, 16, 17, 18, 19, 20, 21, 22 ];
a_sfCheck_SFG_fj01 = concat(ca_sfCheck_SFG_fj01_000);
b_sfCheck_SFG_fj01 = [cb_sfCheck_SFG_fj01_000];
ca_sfCheck_SFG_fj02_000 = [ [ 0.0000, 0.0000 ],[ 0.9755, -0.0961 ],[ 1.9134, -0.3806 ],[ 2.7779, -0.8427 ],[ 3.5355, -1.4645 ],[ 4.1573, -2.2221 ],[ 4.6194, -3.0866 ],[ 4.9039, -4.0245 ],[ 5.0000, -5.0000 ],[ 15.0000, -5.0000 ],[ 14.8717, -3.0421 ],[ 14.4889, -1.1177 ],[ 13.8582, 0.7403 ],[ 12.9904, 2.5000 ],[ 11.9003, 4.1314 ],[ 10.6066, 5.6066 ],[ 9.1314, 6.9003 ],[ 7.5000, 7.9904 ],[ 5.7403, 8.8582 ],[ 3.8823, 9.4889 ],[ 1.9579, 9.8717 ],[ -0.0000, 10.0000 ],[ 0.0000, 0.0000 ] ];
cb_sfCheck_SFG_fj02_000 = [  0, 1, 2, 3, 4, 5, 6, 7, 8, 9, 10, 11, 12, 13, 14, 15, 16, 17, 18, 19, 20, 21, 22 ];
a_sfCheck_SFG_fj02 = concat(ca_sfCheck_SFG_fj02_000);
b_sfCheck_SFG_fj02 = [cb_sfCheck_SFG_fj02_000];

module subpax_sfCheck_SFG_f00 () {
	translate( [ 0, 0, 0 ])
		rotate( [ 0, 0, 0 ])
			   linear_extrude(height = 10) polygon(a_sfCheck_SFG_f00, b_sfCheck_SFG_f00);
}

module subpax_sfCheck_SFG_f01 () {
	translate( [ 105, -3.061616997868383e-16, -5 ])
		rotate( [ 3.5083546492674384e-15, 90, 0 ])
			   linear_extrude(height = 10) polygon(a_sfCheck_SFG_f01, b_sfCheck_SFG_f01);
}

module subpax_sfCheck_SFG_f02 () {
	translate( [ 100, 80.00000000000001, 169.99999999999997 ])
		rotate( [ -180, -7.016709298534874e-15, -7.0167092985348775e-15 ])
			   linear_extrude(height = 10) polygon(a_sfCheck_SFG_f02, b_sfCheck_SFG_f02);
}

module subpax_sfCheck_SFG_f03 () {
	translate( [ 75, 10.000000000000002, 15 ])
		rotate( [ 3.5083546492674384e-15, 90, 0 ])
			   linear_extrude(height = 10) polygon(a_sfCheck_SFG_f03, b_sfCheck_SFG_f03);
}

module subpax_sfCheck_SFG_fj00 () {
	translate( [ 100, 80, 0 ])
		rotate( [ 90, 0, 0 ])
			   linear_extrude(height = 80) polygon(a_sfCheck_SFG_fj00, b_sfCheck_SFG_fj00);
}

module subpax_sfCheck_SFG_fj01 () {
	translate( [ 90, 10, 0 ])
		rotate( [ 90, 0, 180 ])
			   linear_extrude(height = 60) polygon(a_sfCheck_SFG_fj01, b_sfCheck_SFG_fj01);
}

module subpax_sfCheck_SFG_fj02 () {
	translate( [ 105, 80.00000000000001, 174.99999999999997 ])
		rotate( [ 90, 90, 0 ])
			   linear_extrude(height = 80) polygon(a_sfCheck_SFG_fj02, b_sfCheck_SFG_fj02);
}

module pax_sfCheck () {
	union () {
		subpax_sfCheck_SFG_f00();
subpax_sfCheck_SFG_f01();
subpax_sfCheck_SFG_f02();
subpax_sfCheck_SFG_f03();
subpax_sfCheck_SFG_fj00();
subpax_sfCheck_SFG_fj01();
subpax_sfCheck_SFG_fj02();
	}
}

pax_sfCheck();
